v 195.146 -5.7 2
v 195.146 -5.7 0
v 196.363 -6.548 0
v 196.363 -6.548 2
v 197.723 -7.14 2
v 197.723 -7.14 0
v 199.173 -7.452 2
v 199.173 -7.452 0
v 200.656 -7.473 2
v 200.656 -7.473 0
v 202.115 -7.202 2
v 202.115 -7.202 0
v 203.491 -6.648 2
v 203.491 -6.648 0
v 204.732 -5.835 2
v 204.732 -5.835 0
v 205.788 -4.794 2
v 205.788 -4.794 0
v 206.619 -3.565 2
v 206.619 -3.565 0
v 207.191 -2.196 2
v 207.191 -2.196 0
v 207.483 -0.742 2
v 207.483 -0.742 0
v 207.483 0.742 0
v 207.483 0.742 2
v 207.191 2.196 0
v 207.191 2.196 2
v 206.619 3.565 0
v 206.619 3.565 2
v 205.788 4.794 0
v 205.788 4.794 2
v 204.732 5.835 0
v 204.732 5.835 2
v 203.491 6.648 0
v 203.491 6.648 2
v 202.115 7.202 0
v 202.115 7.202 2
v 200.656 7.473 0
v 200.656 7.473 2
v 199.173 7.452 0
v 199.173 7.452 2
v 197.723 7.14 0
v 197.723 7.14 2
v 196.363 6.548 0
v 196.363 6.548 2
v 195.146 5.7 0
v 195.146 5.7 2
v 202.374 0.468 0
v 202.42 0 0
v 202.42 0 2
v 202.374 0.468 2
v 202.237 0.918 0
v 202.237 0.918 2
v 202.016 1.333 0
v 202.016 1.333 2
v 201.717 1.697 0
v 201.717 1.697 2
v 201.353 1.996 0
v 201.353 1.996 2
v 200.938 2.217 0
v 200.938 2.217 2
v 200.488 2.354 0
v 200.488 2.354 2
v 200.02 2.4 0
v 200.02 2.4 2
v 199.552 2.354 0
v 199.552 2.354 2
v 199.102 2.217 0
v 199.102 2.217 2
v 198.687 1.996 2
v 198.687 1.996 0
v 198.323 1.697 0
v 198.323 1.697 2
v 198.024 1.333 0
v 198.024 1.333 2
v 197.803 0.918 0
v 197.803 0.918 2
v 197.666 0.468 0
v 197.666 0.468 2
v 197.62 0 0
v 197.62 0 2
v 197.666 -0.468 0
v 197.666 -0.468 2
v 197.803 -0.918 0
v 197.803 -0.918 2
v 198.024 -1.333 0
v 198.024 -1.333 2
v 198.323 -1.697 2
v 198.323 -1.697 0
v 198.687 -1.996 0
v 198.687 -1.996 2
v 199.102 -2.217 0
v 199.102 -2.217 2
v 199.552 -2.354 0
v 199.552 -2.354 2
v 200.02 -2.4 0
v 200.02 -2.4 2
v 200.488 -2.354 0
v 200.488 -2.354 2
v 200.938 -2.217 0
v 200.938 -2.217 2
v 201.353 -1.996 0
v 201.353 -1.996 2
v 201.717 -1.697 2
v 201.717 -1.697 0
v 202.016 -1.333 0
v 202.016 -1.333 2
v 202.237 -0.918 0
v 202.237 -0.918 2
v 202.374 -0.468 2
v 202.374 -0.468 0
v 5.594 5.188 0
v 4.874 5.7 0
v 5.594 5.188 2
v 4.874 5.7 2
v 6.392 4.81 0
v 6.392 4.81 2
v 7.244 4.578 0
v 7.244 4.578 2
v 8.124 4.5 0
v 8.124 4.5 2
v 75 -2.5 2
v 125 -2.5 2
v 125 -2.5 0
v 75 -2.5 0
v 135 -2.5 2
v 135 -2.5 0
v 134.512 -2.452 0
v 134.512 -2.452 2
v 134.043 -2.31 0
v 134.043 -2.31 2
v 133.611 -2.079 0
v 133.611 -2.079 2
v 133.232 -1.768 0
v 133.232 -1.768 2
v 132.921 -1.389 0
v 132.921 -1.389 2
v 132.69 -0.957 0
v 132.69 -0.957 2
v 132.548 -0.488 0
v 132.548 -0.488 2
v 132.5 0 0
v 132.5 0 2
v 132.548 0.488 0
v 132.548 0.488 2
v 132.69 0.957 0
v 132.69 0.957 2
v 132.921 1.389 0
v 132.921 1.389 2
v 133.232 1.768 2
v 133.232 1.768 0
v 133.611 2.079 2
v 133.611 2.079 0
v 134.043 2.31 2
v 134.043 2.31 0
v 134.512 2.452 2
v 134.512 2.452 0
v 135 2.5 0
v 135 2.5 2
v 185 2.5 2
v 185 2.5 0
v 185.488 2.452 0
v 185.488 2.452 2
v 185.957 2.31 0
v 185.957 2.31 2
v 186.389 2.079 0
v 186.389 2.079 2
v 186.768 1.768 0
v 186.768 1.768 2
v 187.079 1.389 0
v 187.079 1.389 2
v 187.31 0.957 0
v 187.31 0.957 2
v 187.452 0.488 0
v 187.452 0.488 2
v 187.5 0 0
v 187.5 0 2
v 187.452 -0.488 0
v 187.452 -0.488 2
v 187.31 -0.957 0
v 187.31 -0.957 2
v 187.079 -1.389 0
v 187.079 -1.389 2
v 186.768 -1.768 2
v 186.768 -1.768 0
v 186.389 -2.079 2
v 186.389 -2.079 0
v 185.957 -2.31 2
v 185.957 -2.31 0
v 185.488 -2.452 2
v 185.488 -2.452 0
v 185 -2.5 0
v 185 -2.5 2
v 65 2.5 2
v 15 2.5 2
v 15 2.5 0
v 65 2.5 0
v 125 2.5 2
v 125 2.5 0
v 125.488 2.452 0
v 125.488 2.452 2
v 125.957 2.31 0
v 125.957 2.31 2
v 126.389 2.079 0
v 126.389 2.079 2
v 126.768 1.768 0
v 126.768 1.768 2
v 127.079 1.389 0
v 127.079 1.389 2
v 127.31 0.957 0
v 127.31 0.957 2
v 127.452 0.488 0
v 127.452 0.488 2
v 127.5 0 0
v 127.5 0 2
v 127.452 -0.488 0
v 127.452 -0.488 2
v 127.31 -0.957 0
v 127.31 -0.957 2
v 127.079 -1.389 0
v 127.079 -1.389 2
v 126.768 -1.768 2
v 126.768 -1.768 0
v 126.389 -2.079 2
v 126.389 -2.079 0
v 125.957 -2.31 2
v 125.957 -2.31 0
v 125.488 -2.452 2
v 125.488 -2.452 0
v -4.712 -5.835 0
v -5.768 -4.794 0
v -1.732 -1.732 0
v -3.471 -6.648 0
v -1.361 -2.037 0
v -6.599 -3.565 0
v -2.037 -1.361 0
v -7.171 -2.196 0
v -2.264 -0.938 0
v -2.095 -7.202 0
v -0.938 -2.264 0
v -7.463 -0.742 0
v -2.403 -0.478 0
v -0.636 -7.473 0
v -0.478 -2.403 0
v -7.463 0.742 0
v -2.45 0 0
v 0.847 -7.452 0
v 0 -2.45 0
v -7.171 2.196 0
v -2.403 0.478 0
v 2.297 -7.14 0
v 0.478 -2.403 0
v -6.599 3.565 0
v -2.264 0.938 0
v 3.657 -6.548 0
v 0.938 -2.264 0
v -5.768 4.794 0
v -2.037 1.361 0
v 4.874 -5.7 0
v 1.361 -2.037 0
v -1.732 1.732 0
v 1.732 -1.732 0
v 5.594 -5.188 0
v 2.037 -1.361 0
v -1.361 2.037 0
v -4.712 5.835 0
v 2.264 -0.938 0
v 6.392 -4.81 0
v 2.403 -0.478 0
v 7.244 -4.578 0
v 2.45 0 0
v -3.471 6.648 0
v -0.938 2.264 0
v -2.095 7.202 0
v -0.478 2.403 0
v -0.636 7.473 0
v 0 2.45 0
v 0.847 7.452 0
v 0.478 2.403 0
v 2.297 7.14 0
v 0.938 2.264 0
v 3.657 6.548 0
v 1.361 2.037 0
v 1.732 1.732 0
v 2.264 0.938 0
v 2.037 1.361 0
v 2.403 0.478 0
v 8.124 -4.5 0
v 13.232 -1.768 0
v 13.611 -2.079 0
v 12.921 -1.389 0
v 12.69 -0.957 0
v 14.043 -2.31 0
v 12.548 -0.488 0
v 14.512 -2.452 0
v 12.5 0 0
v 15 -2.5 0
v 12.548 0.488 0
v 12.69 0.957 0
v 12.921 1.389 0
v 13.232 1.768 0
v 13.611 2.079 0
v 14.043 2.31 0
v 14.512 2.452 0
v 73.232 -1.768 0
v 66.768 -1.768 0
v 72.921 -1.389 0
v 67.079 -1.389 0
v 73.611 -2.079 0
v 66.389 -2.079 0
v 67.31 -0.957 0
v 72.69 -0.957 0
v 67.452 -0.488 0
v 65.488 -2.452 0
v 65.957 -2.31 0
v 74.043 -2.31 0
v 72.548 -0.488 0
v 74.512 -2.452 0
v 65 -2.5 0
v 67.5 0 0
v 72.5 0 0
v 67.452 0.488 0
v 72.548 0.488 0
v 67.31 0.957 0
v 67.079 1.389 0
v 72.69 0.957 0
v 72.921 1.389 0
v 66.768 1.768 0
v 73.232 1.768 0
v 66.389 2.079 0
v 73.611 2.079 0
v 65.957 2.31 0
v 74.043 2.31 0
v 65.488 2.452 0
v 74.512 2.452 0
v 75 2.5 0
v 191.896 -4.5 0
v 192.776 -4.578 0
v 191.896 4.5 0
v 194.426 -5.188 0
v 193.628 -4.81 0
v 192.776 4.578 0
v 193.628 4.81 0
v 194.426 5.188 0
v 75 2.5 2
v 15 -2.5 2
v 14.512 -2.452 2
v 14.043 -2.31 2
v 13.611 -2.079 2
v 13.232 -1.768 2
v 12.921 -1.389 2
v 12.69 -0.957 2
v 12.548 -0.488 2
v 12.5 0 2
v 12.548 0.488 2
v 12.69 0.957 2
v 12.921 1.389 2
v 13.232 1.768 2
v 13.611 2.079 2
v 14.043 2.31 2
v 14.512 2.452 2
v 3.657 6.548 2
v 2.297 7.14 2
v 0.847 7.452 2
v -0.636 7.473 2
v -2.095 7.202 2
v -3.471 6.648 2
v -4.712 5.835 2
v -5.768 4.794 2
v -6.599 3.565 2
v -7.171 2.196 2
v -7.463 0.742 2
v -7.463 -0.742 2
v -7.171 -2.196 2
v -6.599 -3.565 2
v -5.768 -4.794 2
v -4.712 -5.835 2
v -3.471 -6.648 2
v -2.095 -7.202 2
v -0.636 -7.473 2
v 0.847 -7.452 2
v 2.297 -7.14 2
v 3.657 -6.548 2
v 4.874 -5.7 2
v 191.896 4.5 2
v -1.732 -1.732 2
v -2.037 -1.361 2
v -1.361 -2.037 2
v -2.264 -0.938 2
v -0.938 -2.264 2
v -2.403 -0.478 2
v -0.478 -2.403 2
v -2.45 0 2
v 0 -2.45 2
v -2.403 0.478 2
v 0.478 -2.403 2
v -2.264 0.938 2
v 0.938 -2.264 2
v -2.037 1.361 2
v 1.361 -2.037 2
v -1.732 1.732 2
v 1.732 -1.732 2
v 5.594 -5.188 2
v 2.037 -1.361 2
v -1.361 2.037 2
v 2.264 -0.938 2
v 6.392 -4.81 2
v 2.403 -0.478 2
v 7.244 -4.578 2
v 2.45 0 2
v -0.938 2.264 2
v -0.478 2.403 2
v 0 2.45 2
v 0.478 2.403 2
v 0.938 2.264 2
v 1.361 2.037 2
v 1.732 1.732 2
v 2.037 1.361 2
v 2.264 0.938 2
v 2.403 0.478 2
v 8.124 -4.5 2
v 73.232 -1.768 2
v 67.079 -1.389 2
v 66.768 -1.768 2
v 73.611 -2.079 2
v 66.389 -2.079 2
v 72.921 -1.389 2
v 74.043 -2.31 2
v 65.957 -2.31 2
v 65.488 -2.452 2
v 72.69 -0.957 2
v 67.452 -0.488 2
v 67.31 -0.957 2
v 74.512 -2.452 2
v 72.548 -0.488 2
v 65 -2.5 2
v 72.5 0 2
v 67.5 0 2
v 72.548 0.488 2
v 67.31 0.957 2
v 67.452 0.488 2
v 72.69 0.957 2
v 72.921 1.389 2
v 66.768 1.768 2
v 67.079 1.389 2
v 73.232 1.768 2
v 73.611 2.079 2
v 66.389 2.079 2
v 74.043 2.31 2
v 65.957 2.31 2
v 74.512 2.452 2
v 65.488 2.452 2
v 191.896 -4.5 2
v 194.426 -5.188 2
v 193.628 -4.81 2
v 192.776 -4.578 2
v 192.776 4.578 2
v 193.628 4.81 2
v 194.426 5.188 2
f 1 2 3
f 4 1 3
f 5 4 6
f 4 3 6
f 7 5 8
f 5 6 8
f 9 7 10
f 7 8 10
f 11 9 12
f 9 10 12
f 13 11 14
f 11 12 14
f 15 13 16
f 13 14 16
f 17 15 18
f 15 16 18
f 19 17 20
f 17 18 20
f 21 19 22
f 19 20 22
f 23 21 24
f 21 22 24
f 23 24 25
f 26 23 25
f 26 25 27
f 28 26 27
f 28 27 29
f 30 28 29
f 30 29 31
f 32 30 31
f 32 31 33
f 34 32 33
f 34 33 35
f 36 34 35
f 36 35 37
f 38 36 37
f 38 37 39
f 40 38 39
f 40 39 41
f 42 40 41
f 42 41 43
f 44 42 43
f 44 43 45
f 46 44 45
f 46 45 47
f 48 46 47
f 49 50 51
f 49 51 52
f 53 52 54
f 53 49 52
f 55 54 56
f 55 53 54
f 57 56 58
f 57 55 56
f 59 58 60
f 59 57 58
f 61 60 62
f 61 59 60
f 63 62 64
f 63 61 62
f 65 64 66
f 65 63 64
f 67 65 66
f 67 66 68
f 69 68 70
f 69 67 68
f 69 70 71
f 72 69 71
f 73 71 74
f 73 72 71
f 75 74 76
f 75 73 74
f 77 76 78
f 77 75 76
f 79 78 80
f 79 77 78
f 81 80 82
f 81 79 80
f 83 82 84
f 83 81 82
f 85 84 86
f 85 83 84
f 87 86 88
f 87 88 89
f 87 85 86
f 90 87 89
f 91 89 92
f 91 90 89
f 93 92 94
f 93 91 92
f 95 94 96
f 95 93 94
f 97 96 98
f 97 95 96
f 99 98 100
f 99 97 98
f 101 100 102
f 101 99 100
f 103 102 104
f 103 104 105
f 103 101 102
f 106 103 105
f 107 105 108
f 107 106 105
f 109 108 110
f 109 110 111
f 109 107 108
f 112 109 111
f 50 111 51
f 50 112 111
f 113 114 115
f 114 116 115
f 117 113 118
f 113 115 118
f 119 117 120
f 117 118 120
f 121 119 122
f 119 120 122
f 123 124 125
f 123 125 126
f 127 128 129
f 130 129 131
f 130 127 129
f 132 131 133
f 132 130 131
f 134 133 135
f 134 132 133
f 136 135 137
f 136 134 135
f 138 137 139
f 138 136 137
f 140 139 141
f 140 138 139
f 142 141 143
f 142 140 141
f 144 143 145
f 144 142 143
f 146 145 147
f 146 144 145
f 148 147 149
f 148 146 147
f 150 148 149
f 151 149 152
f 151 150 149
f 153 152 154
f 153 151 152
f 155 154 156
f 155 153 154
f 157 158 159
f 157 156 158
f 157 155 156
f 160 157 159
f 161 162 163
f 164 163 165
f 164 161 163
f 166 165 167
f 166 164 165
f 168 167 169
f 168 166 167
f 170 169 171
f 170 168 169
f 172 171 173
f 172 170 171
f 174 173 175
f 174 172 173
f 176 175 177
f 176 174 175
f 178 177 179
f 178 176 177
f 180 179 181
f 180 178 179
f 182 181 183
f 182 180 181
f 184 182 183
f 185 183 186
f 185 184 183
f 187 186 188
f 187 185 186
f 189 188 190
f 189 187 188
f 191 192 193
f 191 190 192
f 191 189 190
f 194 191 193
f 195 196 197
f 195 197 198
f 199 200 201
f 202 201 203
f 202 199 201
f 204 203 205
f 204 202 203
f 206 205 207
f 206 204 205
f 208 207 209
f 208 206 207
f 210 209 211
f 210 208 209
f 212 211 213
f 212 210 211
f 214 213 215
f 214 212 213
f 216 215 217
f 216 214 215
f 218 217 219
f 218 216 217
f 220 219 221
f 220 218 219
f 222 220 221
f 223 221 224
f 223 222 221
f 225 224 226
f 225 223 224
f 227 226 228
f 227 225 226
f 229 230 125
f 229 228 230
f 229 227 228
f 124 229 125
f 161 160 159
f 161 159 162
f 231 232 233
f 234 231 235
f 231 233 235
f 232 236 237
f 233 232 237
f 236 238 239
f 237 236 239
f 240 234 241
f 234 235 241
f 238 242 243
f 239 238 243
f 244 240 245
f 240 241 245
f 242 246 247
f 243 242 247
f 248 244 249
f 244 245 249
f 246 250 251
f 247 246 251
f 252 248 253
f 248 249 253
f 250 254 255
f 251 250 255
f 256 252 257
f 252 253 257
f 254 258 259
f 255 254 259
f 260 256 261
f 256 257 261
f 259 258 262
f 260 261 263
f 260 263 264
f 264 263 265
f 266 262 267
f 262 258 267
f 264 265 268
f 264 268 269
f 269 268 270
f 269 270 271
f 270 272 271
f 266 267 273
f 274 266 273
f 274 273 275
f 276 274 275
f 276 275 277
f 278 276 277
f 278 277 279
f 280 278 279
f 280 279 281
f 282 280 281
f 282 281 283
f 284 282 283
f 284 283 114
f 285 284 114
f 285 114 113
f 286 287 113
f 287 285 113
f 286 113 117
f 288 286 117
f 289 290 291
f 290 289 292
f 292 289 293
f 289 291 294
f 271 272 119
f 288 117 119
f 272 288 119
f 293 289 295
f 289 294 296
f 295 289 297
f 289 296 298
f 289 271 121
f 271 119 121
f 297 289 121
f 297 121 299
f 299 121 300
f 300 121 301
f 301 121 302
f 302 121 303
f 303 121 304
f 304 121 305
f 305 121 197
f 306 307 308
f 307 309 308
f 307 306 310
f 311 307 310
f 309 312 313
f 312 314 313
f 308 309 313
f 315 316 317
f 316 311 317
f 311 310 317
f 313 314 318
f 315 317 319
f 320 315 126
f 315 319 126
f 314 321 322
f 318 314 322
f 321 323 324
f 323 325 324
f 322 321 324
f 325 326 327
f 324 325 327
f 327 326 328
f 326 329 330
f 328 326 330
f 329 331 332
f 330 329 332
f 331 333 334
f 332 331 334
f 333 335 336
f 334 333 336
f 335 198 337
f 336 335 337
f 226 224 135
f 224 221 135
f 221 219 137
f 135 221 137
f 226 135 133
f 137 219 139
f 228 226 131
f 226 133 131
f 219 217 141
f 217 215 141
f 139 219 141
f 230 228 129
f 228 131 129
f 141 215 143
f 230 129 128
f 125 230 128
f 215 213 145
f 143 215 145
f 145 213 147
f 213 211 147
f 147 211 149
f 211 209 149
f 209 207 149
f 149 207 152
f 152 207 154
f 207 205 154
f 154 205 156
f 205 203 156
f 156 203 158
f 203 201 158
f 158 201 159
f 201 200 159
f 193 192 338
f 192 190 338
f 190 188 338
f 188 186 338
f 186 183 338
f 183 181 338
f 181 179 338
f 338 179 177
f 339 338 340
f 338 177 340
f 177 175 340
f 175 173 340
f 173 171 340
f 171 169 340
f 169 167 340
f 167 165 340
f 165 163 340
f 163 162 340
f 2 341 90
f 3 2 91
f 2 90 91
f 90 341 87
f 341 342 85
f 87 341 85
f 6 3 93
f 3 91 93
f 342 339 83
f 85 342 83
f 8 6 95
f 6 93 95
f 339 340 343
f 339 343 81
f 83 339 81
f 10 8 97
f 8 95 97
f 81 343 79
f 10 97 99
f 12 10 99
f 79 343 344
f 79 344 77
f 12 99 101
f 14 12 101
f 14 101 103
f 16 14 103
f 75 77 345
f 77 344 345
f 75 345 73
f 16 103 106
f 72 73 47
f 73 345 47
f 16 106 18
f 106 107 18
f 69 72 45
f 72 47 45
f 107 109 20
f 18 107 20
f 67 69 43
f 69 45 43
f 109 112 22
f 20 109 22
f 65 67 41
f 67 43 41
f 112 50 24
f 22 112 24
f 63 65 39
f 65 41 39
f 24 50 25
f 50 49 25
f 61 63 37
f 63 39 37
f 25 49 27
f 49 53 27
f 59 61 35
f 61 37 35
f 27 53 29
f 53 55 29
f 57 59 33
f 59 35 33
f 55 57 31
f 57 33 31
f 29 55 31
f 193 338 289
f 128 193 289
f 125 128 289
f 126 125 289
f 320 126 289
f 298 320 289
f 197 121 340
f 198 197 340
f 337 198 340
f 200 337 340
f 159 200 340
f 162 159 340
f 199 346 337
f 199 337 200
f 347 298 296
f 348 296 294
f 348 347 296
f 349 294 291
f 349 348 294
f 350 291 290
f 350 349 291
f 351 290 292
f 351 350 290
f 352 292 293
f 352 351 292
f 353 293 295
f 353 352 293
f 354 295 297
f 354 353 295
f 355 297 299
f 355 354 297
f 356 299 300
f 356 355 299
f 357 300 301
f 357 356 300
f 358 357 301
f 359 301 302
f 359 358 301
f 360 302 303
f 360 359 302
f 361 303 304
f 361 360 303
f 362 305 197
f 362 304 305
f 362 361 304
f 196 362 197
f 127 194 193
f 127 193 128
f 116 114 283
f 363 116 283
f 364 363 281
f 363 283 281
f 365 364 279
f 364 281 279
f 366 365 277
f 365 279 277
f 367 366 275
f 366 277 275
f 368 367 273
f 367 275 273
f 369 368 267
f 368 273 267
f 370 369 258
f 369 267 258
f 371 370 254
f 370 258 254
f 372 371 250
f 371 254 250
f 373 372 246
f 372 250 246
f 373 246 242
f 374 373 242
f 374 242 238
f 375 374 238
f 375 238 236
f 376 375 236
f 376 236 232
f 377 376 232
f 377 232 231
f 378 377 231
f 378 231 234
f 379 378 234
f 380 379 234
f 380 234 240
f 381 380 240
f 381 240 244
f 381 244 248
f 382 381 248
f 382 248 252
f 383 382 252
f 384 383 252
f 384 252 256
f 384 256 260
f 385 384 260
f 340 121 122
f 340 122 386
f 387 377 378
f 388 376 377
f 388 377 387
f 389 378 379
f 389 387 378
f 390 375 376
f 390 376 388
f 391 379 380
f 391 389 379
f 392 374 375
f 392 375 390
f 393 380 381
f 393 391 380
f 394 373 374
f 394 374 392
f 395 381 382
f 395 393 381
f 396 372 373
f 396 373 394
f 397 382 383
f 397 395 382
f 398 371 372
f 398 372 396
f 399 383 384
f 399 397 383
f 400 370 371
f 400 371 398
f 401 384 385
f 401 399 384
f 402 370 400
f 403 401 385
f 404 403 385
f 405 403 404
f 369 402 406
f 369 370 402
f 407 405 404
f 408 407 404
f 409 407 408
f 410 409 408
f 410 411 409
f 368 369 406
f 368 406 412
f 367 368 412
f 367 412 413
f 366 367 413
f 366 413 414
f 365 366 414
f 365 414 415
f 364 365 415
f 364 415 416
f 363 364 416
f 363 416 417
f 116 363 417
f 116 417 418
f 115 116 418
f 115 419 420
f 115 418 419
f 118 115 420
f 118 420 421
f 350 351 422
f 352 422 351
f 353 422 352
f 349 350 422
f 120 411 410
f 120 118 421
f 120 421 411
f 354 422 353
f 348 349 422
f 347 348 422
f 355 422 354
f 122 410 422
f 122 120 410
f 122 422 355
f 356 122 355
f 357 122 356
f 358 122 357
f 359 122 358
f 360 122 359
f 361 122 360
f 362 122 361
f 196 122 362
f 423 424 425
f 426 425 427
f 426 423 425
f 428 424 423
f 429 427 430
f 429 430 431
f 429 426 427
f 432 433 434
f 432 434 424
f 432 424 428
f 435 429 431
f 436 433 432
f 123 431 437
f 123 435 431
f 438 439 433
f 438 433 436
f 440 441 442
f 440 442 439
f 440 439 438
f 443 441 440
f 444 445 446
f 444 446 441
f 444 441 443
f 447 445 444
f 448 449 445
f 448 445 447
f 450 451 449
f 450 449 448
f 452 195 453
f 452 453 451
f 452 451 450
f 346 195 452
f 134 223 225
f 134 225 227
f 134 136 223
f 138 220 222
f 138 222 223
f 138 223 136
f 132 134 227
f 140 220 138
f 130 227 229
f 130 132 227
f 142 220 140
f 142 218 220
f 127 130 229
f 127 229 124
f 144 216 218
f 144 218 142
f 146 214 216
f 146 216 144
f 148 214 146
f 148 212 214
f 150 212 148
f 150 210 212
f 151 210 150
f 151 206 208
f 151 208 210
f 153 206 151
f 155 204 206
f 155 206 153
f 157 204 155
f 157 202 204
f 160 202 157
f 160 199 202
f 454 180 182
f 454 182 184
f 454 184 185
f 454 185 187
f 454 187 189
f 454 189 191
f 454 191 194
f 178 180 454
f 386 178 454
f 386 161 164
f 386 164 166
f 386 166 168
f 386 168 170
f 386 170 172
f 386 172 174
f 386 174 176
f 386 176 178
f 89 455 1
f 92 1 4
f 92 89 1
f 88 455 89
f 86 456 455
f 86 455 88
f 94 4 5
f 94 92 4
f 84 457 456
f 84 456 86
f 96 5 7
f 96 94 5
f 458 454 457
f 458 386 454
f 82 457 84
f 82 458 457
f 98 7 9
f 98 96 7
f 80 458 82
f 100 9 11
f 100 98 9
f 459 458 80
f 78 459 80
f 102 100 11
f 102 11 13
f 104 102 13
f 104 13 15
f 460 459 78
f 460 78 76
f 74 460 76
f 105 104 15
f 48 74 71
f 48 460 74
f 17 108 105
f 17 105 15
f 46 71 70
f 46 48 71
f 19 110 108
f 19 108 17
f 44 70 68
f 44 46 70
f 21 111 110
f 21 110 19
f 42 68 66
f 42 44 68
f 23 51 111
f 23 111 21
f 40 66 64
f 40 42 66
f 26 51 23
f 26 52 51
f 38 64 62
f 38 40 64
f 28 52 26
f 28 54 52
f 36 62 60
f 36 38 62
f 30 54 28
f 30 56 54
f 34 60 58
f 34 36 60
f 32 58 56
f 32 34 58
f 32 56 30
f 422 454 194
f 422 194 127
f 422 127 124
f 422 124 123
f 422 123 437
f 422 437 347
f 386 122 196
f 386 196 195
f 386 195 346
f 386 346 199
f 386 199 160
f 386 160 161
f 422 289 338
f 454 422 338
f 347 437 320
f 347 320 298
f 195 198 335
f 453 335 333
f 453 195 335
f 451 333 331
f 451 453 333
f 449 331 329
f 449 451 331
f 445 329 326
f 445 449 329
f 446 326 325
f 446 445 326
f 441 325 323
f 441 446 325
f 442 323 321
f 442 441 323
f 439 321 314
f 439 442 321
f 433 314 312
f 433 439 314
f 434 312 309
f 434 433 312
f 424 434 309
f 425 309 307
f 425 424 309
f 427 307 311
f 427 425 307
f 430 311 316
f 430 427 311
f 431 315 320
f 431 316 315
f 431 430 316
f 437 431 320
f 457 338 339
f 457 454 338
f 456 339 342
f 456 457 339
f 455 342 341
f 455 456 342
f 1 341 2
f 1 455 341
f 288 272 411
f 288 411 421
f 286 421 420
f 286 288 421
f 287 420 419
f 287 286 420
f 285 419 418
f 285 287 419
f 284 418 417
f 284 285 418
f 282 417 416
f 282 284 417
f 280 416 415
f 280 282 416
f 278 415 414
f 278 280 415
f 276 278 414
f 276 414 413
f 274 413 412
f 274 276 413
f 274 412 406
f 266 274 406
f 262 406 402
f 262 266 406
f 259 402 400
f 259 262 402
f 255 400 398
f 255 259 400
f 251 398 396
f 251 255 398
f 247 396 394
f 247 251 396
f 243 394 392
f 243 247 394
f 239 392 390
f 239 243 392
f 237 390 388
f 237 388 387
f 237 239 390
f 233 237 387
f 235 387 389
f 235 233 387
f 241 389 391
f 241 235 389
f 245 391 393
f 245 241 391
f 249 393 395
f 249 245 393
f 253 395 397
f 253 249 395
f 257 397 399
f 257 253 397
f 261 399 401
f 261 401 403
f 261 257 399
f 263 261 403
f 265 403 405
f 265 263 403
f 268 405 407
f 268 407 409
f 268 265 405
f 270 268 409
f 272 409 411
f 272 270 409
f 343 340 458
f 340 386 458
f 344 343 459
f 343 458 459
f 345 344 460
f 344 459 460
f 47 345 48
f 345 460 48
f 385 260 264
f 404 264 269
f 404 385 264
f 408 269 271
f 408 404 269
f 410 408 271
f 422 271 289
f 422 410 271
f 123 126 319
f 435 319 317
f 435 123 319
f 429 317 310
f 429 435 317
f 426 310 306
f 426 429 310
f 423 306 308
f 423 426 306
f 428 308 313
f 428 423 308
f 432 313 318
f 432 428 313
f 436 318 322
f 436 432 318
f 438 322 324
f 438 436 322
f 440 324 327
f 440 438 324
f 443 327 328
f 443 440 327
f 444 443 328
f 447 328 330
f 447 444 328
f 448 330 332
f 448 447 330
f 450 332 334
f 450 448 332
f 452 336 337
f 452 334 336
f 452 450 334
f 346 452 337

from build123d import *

# Parameters (mm, degrees)
SKETCH1_R           = 7.5
SKETCH1_R_2         = 2.45
SKETCH1_R_3         = 2.4
SKETCH1_W           = 188.02
SKETCH1_H           = 9
BOSS_EXTRUDE1_DEPTH = 2
CUT_EXTRUDE1_DEPTH  = 208.665115992
FILLET1_R           = 5


with BuildPart() as part:
    # Sketch1 → Boss-Extrude1 (new body)
    # profile 1 of 3: a face of its own
    with BuildSketch(Plane.XY):
        Circle(SKETCH1_R)
        Circle(SKETCH1_R_2, mode=Mode.SUBTRACT)
    # profile 2 of 3: a face of its own
    with BuildSketch(Plane.XY):
        with Locations((200.02, 0)):
            Circle(SKETCH1_R)
        with Locations((200.02, 0)):
            Circle(SKETCH1_R_3, mode=Mode.SUBTRACT)
    # profile 3 of 3: a face of its own
    with BuildSketch(Plane.XY):
        with Locations((100.01, 0)):
            Rectangle(SKETCH1_W, SKETCH1_H)
    extrude(amount=BOSS_EXTRUDE1_DEPTH)

    # Sketch2 → Cut-Extrude1 (cut, through all)
    with BuildSketch(Plane.XY.offset(2)):
        with BuildLine():
            Line((75, 2.5), (125, 2.5))
            ThreePointArc((125, 2.5), (127.5, 0), (125, -2.5))
            Line((125, -2.5), (75, -2.5))
            ThreePointArc((75, -2.5), (72.5, 0), (75, 2.5))
        make_face()
        with BuildLine():
            Line((135, 2.5), (185, 2.5))
            ThreePointArc((185, 2.5), (187.5, 0), (185, -2.5))
            Line((185, -2.5), (135, -2.5))
            ThreePointArc((135, -2.5), (132.5, 0), (135, 2.5))
        make_face()
        with BuildLine():
            Line((15, 2.5), (65, 2.5))
            ThreePointArc((65, 2.5), (67.5, 0), (65, -2.5))
            Line((65, -2.5), (15, -2.5))
            ThreePointArc((15, -2.5), (12.5, 0), (15, 2.5))
        make_face()
    extrude(amount=-CUT_EXTRUDE1_DEPTH, mode=Mode.SUBTRACT)

    # Fillet1
    fillet1_edges = [part.edges().sort_by_distance(p)[0] for p in [
        (6, -4.5, 1),
        (6, 4.5, 1),
        (194.02, 4.5, 1),
        (194.02, -4.5, 1),
    ]]
    fillet(fillet1_edges, radius=FILLET1_R)


solid = part.part
